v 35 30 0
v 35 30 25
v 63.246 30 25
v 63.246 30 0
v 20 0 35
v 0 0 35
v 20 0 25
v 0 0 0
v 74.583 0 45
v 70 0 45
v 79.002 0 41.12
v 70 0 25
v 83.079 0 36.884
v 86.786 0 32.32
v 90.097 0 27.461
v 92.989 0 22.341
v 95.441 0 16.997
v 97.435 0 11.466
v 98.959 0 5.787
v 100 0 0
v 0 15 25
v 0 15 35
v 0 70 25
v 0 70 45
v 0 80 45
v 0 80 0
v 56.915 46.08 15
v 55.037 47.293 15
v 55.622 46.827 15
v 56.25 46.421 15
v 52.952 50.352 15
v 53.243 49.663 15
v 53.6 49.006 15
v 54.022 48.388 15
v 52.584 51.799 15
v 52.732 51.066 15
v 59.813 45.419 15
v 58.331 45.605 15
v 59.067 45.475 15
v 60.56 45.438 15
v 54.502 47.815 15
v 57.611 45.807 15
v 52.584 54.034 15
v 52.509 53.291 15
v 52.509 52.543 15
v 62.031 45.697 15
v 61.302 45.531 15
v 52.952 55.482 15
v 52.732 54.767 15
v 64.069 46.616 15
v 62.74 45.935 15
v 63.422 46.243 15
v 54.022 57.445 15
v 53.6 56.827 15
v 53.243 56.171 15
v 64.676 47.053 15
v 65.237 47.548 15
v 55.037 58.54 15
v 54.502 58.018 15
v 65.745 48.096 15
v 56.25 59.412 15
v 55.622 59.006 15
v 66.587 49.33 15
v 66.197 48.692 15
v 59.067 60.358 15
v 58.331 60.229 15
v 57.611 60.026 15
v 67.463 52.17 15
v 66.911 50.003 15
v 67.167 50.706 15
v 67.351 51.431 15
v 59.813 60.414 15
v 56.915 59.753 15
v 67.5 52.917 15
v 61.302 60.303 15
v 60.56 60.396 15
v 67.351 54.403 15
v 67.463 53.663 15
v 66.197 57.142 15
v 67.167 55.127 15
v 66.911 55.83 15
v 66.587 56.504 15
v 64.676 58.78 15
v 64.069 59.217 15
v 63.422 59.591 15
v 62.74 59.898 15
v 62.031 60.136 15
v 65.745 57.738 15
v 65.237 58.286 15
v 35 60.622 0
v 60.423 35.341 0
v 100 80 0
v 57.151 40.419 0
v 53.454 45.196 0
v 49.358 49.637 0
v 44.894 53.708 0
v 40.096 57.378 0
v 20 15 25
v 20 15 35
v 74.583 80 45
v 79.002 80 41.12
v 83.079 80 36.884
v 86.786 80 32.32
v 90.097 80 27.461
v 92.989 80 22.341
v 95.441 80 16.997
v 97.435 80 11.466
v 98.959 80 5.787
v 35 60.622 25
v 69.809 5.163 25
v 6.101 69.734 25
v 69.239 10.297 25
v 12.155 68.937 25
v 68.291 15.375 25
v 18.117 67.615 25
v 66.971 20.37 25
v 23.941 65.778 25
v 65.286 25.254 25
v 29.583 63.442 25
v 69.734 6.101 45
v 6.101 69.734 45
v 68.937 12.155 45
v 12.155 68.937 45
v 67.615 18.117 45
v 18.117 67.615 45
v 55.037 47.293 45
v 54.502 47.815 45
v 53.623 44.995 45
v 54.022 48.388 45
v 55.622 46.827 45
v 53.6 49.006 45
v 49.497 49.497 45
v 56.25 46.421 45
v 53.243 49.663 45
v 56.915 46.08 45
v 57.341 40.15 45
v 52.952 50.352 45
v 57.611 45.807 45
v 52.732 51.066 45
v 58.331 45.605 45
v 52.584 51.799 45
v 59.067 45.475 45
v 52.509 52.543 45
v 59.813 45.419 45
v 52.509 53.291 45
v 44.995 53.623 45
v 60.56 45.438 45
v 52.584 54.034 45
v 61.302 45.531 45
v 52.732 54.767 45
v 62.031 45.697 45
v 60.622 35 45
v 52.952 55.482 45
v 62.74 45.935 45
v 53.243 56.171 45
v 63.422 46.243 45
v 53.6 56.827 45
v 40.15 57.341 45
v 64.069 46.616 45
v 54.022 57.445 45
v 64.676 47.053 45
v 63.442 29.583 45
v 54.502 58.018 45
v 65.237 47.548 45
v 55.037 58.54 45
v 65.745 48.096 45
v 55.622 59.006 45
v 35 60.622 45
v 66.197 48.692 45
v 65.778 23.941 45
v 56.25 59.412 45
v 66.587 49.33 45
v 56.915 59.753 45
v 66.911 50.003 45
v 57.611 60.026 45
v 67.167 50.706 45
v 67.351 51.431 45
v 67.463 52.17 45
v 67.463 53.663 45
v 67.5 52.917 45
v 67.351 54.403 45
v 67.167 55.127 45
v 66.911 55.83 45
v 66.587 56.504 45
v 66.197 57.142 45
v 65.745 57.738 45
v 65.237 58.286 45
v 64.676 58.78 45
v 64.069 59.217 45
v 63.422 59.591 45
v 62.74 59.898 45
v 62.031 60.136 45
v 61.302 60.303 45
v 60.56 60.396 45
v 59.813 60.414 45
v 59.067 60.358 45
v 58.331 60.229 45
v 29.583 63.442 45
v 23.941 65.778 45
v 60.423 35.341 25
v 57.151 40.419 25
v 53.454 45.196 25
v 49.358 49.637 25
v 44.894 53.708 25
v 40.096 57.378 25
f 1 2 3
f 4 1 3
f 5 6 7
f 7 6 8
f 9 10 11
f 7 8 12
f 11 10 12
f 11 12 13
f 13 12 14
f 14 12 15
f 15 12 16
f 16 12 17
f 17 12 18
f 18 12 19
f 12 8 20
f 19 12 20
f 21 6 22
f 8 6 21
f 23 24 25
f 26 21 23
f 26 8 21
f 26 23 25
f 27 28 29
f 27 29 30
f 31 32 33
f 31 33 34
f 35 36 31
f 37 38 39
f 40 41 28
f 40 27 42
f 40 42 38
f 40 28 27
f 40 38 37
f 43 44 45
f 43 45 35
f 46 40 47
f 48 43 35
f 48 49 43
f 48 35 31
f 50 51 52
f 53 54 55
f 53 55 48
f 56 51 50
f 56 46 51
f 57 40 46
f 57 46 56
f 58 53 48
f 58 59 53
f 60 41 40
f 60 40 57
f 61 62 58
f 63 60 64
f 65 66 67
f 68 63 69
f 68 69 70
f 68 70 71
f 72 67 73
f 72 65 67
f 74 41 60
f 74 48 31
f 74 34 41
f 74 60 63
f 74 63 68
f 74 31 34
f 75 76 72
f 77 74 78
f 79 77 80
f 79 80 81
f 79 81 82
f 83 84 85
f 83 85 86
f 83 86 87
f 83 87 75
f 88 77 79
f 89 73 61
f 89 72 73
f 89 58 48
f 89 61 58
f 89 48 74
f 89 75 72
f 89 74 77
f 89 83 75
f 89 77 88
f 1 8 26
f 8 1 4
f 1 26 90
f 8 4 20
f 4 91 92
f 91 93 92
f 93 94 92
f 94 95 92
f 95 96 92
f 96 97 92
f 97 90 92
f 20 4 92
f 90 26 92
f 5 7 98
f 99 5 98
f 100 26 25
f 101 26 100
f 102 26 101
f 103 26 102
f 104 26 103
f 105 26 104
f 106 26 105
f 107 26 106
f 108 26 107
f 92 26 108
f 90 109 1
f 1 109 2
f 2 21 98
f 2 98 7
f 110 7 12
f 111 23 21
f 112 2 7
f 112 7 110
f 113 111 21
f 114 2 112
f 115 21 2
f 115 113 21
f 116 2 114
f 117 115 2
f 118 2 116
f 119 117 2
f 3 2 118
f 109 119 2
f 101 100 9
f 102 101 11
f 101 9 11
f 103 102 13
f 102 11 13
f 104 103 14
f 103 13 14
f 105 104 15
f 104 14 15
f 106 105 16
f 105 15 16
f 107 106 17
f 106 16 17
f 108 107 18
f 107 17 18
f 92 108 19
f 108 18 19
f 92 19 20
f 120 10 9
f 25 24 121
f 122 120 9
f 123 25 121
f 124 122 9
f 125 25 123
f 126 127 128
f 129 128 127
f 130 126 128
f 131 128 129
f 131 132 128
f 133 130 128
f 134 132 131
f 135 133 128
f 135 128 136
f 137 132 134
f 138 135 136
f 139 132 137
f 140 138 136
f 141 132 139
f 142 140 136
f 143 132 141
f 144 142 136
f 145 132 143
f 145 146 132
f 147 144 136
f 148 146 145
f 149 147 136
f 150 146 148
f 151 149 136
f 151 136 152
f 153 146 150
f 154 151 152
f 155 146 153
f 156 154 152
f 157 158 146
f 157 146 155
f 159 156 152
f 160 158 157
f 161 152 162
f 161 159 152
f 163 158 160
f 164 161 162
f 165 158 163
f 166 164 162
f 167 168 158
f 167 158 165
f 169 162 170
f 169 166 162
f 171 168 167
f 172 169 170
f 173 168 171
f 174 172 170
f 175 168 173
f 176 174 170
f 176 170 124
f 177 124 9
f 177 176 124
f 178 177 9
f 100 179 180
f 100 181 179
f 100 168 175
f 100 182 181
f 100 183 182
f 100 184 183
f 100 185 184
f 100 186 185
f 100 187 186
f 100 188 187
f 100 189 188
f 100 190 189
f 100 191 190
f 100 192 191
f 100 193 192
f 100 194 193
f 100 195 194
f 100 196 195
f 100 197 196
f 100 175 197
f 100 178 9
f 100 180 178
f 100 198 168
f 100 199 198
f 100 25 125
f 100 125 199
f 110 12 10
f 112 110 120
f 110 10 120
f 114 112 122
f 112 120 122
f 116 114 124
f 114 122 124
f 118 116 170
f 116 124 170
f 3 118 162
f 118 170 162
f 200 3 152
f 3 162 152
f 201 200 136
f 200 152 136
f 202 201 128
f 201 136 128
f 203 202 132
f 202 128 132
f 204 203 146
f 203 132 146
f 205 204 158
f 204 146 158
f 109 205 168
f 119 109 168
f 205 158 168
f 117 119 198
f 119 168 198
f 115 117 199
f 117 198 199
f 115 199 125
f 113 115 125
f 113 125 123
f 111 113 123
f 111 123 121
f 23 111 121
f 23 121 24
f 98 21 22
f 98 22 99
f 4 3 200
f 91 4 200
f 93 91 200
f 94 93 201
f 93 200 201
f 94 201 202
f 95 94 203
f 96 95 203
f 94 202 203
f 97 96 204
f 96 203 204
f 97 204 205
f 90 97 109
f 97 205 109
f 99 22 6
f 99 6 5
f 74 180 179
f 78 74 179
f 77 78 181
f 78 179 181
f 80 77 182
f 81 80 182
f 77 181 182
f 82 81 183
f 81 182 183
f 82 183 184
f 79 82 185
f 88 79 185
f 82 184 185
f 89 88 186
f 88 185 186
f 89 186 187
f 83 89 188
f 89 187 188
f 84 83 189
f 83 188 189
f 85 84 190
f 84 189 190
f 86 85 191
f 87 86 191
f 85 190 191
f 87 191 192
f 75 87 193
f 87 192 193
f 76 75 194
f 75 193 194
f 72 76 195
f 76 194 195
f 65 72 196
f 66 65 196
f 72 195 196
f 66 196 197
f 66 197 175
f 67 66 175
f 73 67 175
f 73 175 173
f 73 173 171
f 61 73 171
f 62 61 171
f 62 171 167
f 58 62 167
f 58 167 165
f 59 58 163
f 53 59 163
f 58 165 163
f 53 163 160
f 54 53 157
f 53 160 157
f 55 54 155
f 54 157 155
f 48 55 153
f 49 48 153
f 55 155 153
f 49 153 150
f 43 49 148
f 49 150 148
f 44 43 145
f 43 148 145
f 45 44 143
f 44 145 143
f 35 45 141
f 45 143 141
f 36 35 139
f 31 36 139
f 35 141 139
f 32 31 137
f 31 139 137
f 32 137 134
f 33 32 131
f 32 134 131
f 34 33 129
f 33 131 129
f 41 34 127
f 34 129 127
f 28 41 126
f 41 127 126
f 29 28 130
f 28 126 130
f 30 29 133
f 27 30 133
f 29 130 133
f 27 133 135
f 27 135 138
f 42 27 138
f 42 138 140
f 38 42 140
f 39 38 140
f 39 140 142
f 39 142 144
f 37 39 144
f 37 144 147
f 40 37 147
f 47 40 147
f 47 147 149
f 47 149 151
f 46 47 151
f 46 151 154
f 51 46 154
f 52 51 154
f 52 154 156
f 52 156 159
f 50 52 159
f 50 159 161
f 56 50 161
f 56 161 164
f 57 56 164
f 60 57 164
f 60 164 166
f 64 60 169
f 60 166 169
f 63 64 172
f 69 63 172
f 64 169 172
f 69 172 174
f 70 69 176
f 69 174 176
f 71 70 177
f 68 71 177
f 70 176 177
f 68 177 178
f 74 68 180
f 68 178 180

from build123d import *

# Parameters (mm, degrees)
F0_W      = 100
F0_H      = 80
F1_DEPTH  = 45
F2_R      = 7.5
F3_DEPTH  = 30
F4_R      = 70
F5_DEPTH  = 20
F6_W      = 20
F6_H      = 15
F7_DEPTH  = 10
F9_DEPTH  = 25.001
F11_DEPTH = 80.001


with BuildPart() as f1:
    # F0 (on Top) → F1 (new body)
    with BuildSketch(Plane.XY):
        with Locations((50, 40)):
            Rectangle(F0_W, F0_H)
    extrude(amount=F1_DEPTH)

    # F2 (on face) → F3 (cut)
    with BuildSketch(Plane.XY.offset(45)):
        with Locations((60, 52.916668)):
            Circle(F2_R)
    extrude(amount=-F3_DEPTH, mode=Mode.SUBTRACT)

    # F4 (on face) → F5 (cut)
    with BuildSketch(Plane.XY.offset(45)):
        Circle(F4_R)
    extrude(amount=-F5_DEPTH, mode=Mode.SUBTRACT)

    # F6 (on face) → F7 (join)
    with BuildSketch(Plane.XY.offset(25)):
        with Locations((10, 7.5)):
            Rectangle(F6_W, F6_H)
    extrude(amount=F7_DEPTH)

    # F8 (on face) → F9 (cut, through all)
    with BuildSketch(Plane.XY.offset(25)):
        with BuildLine():
            ThreePointArc((63.245553, 30), (51.453576, 47.460821), (35, 60.621778))
            Line((35, 60.621778), (35, 30))
            Line((35, 30), (63.245553, 30))
        make_face()
    extrude(amount=-F9_DEPTH, mode=Mode.SUBTRACT)

    # F10 (on face) → F11 (cut, through all)
    with BuildSketch(Plane.XZ):
        with BuildLine():
            ThreePointArc((74.583337, 45), (91.596706, 24.931549), (100, 0))
            Line((100, 0), (100, 45))
            Line((100, 45), (74.583337, 45))
        make_face()
    extrude(amount=-F11_DEPTH, mode=Mode.SUBTRACT)


solid = f1.part
